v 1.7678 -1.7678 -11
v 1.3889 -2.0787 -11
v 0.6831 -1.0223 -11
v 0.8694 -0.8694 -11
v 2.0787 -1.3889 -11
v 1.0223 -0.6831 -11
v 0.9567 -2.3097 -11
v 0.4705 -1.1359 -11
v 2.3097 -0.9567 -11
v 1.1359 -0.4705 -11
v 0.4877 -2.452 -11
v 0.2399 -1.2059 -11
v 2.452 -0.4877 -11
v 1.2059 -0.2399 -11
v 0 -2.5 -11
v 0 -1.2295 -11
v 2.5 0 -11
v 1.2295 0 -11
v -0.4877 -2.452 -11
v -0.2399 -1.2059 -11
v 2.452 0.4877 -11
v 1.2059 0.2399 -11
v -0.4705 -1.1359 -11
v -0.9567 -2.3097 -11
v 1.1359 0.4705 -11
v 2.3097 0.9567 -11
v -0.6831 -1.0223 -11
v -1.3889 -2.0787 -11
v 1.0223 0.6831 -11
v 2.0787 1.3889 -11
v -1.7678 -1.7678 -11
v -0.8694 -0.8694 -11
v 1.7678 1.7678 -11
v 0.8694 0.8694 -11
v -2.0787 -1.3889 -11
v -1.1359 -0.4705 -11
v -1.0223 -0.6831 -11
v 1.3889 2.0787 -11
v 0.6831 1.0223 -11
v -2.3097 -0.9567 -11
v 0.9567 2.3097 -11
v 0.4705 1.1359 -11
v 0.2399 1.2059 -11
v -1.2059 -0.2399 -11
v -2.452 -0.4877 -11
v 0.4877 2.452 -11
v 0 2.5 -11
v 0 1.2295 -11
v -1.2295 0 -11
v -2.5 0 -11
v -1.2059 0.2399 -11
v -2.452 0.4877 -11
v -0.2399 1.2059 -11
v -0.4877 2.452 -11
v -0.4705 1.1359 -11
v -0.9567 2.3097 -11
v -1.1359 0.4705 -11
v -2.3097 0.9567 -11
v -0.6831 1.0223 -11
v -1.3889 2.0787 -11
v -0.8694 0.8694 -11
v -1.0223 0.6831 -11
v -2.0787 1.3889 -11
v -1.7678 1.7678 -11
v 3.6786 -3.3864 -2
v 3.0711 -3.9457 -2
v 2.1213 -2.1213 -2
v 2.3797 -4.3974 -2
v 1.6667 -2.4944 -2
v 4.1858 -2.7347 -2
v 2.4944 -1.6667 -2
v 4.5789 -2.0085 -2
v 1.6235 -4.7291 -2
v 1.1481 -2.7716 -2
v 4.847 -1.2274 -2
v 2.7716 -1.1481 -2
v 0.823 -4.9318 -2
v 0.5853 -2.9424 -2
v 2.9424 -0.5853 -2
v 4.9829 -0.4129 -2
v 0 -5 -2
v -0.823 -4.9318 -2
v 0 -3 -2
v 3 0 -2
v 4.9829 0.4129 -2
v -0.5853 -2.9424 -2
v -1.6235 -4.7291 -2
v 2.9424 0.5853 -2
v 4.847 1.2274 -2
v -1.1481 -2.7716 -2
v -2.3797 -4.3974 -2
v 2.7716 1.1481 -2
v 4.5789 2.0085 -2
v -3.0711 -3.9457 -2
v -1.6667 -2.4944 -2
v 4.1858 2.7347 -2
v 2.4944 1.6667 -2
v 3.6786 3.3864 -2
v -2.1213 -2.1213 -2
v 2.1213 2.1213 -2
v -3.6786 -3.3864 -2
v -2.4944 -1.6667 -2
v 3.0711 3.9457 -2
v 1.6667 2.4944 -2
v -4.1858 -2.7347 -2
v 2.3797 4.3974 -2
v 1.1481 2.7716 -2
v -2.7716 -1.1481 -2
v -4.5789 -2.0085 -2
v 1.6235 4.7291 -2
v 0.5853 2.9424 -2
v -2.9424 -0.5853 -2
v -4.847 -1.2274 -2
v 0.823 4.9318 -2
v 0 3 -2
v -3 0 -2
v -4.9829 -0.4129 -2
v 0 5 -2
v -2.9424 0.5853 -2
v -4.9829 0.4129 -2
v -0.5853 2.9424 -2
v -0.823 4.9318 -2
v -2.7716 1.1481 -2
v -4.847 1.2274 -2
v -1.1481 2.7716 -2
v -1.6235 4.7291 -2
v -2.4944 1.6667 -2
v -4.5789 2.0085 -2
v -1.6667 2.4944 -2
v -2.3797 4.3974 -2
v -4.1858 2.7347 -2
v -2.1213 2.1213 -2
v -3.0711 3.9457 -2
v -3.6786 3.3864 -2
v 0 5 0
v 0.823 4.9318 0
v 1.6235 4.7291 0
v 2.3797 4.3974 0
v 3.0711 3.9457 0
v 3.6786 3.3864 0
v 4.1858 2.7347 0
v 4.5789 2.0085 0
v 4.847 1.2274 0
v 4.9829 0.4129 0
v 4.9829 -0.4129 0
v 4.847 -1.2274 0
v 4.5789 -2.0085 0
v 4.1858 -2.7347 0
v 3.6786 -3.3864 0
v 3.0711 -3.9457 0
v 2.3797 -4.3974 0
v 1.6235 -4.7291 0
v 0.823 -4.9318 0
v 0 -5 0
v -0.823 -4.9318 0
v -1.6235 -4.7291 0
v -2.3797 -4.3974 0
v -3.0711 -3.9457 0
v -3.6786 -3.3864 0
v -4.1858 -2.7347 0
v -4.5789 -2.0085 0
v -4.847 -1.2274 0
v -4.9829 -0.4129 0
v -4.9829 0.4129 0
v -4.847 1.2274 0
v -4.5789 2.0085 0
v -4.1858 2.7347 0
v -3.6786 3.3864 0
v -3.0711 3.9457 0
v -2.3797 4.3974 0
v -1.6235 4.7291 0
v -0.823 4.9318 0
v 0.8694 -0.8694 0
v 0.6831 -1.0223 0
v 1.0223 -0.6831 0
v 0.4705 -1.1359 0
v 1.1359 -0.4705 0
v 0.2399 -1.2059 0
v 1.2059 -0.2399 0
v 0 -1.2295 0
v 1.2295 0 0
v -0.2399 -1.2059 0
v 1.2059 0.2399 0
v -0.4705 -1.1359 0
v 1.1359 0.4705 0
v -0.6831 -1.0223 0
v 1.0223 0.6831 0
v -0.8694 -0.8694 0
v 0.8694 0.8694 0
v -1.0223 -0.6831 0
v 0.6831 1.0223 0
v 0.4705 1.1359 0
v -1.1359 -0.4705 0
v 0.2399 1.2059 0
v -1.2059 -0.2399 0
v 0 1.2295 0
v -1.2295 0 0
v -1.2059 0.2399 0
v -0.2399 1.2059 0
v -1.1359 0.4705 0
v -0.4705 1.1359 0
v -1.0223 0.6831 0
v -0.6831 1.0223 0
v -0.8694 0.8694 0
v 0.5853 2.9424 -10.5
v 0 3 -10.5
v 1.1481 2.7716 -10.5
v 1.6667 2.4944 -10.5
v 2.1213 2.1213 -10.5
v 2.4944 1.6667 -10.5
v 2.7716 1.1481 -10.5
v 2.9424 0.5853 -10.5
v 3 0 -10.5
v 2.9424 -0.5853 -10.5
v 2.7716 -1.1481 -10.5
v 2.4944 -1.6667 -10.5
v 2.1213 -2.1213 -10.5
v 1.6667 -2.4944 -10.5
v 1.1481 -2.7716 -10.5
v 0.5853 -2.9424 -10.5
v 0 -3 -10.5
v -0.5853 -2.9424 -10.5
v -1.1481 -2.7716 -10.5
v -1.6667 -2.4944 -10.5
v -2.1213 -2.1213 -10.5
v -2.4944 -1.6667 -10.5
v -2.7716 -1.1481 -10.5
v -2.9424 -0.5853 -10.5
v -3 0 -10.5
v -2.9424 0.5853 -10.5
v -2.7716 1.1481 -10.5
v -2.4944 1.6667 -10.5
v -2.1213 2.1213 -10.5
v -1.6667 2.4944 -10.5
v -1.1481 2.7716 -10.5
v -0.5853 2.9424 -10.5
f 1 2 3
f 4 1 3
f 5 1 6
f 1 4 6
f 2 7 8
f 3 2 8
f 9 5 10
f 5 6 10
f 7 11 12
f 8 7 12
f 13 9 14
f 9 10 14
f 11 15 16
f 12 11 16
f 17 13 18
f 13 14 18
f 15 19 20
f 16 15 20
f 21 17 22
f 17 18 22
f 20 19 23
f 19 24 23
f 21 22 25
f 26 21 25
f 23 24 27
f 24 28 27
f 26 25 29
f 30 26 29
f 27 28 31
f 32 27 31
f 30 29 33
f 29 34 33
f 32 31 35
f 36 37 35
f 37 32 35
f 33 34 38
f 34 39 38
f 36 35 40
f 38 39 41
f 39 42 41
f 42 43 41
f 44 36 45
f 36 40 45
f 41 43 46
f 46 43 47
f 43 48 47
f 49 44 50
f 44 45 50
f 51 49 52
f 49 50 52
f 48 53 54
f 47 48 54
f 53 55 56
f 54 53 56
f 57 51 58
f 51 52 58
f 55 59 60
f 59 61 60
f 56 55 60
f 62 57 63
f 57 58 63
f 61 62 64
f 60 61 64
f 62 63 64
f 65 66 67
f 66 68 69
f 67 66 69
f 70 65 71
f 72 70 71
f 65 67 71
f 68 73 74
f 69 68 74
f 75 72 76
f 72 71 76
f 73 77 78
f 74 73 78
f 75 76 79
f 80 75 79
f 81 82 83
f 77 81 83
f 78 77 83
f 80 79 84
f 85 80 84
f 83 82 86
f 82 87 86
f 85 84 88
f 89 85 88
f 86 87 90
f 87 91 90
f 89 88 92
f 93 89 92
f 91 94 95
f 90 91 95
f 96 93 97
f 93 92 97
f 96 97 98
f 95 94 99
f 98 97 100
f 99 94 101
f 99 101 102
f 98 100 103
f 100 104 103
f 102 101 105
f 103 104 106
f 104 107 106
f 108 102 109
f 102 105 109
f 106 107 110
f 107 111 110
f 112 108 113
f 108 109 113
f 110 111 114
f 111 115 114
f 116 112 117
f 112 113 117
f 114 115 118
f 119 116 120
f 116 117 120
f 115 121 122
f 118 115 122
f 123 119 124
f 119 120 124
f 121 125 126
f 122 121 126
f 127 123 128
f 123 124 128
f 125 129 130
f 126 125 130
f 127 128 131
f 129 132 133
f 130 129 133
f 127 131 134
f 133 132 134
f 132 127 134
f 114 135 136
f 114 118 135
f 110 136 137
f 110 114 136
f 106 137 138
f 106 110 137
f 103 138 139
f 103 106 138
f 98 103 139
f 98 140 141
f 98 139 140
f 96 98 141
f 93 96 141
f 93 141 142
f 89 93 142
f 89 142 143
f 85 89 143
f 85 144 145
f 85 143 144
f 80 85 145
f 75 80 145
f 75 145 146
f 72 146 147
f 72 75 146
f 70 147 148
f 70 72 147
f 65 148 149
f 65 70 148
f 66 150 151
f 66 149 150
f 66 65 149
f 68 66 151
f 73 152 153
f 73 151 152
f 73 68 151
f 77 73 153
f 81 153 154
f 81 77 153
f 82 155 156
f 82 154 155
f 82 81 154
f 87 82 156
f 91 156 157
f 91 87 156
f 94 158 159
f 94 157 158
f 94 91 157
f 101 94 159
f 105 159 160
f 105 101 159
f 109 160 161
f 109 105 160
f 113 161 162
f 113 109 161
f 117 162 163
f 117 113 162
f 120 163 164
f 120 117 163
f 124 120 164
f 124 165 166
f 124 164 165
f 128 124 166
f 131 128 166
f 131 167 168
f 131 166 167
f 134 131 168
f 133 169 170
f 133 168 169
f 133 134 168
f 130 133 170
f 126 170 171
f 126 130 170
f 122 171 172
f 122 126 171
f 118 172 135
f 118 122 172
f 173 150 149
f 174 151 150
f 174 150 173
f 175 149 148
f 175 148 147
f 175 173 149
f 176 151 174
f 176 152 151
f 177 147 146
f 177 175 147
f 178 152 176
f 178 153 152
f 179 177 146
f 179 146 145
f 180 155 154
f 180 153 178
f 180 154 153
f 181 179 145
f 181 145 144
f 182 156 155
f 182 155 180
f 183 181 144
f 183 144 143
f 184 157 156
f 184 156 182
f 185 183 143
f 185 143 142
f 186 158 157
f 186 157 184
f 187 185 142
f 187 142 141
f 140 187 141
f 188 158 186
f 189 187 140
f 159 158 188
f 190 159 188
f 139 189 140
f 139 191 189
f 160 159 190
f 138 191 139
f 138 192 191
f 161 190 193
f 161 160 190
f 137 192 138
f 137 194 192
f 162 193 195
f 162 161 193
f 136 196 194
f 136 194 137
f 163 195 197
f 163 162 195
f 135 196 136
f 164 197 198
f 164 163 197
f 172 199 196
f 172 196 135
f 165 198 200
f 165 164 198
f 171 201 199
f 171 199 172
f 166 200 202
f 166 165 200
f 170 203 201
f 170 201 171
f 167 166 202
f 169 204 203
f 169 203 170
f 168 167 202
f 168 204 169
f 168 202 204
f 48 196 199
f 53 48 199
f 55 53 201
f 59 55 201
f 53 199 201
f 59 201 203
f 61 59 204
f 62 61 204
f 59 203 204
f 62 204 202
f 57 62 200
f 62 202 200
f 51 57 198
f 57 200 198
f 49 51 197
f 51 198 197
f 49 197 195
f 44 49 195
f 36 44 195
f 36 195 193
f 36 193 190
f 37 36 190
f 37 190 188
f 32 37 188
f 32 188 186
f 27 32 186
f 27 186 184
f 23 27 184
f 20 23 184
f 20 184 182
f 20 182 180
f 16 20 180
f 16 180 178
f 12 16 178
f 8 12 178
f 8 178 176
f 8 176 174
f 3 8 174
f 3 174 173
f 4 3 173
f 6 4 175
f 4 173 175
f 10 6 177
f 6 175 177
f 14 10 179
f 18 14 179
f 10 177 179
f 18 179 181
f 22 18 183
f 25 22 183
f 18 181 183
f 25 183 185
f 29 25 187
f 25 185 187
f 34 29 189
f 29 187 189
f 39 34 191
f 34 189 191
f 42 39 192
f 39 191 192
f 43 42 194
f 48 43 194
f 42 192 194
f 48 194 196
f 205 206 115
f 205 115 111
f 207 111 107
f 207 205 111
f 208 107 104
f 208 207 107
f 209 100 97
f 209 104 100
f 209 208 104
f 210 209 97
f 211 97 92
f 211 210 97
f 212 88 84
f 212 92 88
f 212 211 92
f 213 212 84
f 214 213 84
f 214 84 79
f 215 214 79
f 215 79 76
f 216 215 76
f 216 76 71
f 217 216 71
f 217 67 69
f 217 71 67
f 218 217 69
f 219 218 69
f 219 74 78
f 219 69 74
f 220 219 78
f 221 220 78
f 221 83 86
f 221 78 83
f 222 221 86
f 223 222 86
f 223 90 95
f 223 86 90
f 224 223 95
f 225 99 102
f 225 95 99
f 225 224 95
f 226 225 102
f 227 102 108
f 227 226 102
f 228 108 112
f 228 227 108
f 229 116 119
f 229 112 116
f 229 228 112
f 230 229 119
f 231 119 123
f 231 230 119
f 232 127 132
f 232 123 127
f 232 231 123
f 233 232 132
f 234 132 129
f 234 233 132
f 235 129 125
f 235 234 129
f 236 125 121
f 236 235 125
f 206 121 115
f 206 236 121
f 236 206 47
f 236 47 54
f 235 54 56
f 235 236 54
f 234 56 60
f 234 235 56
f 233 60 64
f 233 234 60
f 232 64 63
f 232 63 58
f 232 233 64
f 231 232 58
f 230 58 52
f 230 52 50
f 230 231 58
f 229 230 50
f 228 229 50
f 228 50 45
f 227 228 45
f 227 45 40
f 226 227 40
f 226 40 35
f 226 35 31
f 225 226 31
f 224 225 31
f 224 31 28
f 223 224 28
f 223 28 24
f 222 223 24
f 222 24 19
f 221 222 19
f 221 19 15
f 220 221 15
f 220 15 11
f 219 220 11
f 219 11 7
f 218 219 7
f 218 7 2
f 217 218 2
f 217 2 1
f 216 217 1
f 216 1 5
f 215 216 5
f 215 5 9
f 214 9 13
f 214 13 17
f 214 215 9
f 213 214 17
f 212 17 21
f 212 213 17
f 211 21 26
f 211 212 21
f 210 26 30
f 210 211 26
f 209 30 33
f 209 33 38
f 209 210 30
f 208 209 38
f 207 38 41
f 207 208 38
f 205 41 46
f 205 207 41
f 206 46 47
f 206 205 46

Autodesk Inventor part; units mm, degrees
ref_plane "YZ Plane" through (0, 0, 0) normal (1, 0, 0) x (0, 1, 0)
ref_plane "XZ Plane" through (0, 0, 0) normal (0, 1, 0) x (-1, 0, 0)
ref_plane "XY Plane" through (0, 0, 0) normal (0, 0, 1) x (1, 0, 0)
sketch "Esquisse1" plane through (0, 0, 0) normal (1, 0, 0) x (0, 1, 0)
  line L0 (0, 0) -> (5, 0)
  line L1 (5, 0) -> (5, -2)
  line L2 (5, -2) -> (3, -2)
  line L3 (3, -2) -> (3, -11)
  line L4 (3, -11) -> (0, -11)
  line L5 (0, -11) -> (0, 0)
  dimension "d1" = 2
  dimension "d2" = 9
  dimension "d3" = 3
  dimension "d4" = 5
revolve "Révolution1" add sketch "Esquisse1" angle 360 about axis through (0, 0, -11) along (0, 0, 1)
sketch "Esquisse2" plane through (0, 0, -11) normal (0, 0, -1) x (-1, 0, 0)
  point P0 (0, 0)
  point P1 (0, 0)
hole "Perçage1" at (0, 0, -11) direction (0, 0, 1) diameter 2.459 end through all thread size "M3x0.5" class "6H" standard "ANSI Metric M Profile"
chamfer "Chanfrein1" distance 0.5 angle 45 1 edges at (0, -3, -11)
properties part number "axe_taraude_m4"
